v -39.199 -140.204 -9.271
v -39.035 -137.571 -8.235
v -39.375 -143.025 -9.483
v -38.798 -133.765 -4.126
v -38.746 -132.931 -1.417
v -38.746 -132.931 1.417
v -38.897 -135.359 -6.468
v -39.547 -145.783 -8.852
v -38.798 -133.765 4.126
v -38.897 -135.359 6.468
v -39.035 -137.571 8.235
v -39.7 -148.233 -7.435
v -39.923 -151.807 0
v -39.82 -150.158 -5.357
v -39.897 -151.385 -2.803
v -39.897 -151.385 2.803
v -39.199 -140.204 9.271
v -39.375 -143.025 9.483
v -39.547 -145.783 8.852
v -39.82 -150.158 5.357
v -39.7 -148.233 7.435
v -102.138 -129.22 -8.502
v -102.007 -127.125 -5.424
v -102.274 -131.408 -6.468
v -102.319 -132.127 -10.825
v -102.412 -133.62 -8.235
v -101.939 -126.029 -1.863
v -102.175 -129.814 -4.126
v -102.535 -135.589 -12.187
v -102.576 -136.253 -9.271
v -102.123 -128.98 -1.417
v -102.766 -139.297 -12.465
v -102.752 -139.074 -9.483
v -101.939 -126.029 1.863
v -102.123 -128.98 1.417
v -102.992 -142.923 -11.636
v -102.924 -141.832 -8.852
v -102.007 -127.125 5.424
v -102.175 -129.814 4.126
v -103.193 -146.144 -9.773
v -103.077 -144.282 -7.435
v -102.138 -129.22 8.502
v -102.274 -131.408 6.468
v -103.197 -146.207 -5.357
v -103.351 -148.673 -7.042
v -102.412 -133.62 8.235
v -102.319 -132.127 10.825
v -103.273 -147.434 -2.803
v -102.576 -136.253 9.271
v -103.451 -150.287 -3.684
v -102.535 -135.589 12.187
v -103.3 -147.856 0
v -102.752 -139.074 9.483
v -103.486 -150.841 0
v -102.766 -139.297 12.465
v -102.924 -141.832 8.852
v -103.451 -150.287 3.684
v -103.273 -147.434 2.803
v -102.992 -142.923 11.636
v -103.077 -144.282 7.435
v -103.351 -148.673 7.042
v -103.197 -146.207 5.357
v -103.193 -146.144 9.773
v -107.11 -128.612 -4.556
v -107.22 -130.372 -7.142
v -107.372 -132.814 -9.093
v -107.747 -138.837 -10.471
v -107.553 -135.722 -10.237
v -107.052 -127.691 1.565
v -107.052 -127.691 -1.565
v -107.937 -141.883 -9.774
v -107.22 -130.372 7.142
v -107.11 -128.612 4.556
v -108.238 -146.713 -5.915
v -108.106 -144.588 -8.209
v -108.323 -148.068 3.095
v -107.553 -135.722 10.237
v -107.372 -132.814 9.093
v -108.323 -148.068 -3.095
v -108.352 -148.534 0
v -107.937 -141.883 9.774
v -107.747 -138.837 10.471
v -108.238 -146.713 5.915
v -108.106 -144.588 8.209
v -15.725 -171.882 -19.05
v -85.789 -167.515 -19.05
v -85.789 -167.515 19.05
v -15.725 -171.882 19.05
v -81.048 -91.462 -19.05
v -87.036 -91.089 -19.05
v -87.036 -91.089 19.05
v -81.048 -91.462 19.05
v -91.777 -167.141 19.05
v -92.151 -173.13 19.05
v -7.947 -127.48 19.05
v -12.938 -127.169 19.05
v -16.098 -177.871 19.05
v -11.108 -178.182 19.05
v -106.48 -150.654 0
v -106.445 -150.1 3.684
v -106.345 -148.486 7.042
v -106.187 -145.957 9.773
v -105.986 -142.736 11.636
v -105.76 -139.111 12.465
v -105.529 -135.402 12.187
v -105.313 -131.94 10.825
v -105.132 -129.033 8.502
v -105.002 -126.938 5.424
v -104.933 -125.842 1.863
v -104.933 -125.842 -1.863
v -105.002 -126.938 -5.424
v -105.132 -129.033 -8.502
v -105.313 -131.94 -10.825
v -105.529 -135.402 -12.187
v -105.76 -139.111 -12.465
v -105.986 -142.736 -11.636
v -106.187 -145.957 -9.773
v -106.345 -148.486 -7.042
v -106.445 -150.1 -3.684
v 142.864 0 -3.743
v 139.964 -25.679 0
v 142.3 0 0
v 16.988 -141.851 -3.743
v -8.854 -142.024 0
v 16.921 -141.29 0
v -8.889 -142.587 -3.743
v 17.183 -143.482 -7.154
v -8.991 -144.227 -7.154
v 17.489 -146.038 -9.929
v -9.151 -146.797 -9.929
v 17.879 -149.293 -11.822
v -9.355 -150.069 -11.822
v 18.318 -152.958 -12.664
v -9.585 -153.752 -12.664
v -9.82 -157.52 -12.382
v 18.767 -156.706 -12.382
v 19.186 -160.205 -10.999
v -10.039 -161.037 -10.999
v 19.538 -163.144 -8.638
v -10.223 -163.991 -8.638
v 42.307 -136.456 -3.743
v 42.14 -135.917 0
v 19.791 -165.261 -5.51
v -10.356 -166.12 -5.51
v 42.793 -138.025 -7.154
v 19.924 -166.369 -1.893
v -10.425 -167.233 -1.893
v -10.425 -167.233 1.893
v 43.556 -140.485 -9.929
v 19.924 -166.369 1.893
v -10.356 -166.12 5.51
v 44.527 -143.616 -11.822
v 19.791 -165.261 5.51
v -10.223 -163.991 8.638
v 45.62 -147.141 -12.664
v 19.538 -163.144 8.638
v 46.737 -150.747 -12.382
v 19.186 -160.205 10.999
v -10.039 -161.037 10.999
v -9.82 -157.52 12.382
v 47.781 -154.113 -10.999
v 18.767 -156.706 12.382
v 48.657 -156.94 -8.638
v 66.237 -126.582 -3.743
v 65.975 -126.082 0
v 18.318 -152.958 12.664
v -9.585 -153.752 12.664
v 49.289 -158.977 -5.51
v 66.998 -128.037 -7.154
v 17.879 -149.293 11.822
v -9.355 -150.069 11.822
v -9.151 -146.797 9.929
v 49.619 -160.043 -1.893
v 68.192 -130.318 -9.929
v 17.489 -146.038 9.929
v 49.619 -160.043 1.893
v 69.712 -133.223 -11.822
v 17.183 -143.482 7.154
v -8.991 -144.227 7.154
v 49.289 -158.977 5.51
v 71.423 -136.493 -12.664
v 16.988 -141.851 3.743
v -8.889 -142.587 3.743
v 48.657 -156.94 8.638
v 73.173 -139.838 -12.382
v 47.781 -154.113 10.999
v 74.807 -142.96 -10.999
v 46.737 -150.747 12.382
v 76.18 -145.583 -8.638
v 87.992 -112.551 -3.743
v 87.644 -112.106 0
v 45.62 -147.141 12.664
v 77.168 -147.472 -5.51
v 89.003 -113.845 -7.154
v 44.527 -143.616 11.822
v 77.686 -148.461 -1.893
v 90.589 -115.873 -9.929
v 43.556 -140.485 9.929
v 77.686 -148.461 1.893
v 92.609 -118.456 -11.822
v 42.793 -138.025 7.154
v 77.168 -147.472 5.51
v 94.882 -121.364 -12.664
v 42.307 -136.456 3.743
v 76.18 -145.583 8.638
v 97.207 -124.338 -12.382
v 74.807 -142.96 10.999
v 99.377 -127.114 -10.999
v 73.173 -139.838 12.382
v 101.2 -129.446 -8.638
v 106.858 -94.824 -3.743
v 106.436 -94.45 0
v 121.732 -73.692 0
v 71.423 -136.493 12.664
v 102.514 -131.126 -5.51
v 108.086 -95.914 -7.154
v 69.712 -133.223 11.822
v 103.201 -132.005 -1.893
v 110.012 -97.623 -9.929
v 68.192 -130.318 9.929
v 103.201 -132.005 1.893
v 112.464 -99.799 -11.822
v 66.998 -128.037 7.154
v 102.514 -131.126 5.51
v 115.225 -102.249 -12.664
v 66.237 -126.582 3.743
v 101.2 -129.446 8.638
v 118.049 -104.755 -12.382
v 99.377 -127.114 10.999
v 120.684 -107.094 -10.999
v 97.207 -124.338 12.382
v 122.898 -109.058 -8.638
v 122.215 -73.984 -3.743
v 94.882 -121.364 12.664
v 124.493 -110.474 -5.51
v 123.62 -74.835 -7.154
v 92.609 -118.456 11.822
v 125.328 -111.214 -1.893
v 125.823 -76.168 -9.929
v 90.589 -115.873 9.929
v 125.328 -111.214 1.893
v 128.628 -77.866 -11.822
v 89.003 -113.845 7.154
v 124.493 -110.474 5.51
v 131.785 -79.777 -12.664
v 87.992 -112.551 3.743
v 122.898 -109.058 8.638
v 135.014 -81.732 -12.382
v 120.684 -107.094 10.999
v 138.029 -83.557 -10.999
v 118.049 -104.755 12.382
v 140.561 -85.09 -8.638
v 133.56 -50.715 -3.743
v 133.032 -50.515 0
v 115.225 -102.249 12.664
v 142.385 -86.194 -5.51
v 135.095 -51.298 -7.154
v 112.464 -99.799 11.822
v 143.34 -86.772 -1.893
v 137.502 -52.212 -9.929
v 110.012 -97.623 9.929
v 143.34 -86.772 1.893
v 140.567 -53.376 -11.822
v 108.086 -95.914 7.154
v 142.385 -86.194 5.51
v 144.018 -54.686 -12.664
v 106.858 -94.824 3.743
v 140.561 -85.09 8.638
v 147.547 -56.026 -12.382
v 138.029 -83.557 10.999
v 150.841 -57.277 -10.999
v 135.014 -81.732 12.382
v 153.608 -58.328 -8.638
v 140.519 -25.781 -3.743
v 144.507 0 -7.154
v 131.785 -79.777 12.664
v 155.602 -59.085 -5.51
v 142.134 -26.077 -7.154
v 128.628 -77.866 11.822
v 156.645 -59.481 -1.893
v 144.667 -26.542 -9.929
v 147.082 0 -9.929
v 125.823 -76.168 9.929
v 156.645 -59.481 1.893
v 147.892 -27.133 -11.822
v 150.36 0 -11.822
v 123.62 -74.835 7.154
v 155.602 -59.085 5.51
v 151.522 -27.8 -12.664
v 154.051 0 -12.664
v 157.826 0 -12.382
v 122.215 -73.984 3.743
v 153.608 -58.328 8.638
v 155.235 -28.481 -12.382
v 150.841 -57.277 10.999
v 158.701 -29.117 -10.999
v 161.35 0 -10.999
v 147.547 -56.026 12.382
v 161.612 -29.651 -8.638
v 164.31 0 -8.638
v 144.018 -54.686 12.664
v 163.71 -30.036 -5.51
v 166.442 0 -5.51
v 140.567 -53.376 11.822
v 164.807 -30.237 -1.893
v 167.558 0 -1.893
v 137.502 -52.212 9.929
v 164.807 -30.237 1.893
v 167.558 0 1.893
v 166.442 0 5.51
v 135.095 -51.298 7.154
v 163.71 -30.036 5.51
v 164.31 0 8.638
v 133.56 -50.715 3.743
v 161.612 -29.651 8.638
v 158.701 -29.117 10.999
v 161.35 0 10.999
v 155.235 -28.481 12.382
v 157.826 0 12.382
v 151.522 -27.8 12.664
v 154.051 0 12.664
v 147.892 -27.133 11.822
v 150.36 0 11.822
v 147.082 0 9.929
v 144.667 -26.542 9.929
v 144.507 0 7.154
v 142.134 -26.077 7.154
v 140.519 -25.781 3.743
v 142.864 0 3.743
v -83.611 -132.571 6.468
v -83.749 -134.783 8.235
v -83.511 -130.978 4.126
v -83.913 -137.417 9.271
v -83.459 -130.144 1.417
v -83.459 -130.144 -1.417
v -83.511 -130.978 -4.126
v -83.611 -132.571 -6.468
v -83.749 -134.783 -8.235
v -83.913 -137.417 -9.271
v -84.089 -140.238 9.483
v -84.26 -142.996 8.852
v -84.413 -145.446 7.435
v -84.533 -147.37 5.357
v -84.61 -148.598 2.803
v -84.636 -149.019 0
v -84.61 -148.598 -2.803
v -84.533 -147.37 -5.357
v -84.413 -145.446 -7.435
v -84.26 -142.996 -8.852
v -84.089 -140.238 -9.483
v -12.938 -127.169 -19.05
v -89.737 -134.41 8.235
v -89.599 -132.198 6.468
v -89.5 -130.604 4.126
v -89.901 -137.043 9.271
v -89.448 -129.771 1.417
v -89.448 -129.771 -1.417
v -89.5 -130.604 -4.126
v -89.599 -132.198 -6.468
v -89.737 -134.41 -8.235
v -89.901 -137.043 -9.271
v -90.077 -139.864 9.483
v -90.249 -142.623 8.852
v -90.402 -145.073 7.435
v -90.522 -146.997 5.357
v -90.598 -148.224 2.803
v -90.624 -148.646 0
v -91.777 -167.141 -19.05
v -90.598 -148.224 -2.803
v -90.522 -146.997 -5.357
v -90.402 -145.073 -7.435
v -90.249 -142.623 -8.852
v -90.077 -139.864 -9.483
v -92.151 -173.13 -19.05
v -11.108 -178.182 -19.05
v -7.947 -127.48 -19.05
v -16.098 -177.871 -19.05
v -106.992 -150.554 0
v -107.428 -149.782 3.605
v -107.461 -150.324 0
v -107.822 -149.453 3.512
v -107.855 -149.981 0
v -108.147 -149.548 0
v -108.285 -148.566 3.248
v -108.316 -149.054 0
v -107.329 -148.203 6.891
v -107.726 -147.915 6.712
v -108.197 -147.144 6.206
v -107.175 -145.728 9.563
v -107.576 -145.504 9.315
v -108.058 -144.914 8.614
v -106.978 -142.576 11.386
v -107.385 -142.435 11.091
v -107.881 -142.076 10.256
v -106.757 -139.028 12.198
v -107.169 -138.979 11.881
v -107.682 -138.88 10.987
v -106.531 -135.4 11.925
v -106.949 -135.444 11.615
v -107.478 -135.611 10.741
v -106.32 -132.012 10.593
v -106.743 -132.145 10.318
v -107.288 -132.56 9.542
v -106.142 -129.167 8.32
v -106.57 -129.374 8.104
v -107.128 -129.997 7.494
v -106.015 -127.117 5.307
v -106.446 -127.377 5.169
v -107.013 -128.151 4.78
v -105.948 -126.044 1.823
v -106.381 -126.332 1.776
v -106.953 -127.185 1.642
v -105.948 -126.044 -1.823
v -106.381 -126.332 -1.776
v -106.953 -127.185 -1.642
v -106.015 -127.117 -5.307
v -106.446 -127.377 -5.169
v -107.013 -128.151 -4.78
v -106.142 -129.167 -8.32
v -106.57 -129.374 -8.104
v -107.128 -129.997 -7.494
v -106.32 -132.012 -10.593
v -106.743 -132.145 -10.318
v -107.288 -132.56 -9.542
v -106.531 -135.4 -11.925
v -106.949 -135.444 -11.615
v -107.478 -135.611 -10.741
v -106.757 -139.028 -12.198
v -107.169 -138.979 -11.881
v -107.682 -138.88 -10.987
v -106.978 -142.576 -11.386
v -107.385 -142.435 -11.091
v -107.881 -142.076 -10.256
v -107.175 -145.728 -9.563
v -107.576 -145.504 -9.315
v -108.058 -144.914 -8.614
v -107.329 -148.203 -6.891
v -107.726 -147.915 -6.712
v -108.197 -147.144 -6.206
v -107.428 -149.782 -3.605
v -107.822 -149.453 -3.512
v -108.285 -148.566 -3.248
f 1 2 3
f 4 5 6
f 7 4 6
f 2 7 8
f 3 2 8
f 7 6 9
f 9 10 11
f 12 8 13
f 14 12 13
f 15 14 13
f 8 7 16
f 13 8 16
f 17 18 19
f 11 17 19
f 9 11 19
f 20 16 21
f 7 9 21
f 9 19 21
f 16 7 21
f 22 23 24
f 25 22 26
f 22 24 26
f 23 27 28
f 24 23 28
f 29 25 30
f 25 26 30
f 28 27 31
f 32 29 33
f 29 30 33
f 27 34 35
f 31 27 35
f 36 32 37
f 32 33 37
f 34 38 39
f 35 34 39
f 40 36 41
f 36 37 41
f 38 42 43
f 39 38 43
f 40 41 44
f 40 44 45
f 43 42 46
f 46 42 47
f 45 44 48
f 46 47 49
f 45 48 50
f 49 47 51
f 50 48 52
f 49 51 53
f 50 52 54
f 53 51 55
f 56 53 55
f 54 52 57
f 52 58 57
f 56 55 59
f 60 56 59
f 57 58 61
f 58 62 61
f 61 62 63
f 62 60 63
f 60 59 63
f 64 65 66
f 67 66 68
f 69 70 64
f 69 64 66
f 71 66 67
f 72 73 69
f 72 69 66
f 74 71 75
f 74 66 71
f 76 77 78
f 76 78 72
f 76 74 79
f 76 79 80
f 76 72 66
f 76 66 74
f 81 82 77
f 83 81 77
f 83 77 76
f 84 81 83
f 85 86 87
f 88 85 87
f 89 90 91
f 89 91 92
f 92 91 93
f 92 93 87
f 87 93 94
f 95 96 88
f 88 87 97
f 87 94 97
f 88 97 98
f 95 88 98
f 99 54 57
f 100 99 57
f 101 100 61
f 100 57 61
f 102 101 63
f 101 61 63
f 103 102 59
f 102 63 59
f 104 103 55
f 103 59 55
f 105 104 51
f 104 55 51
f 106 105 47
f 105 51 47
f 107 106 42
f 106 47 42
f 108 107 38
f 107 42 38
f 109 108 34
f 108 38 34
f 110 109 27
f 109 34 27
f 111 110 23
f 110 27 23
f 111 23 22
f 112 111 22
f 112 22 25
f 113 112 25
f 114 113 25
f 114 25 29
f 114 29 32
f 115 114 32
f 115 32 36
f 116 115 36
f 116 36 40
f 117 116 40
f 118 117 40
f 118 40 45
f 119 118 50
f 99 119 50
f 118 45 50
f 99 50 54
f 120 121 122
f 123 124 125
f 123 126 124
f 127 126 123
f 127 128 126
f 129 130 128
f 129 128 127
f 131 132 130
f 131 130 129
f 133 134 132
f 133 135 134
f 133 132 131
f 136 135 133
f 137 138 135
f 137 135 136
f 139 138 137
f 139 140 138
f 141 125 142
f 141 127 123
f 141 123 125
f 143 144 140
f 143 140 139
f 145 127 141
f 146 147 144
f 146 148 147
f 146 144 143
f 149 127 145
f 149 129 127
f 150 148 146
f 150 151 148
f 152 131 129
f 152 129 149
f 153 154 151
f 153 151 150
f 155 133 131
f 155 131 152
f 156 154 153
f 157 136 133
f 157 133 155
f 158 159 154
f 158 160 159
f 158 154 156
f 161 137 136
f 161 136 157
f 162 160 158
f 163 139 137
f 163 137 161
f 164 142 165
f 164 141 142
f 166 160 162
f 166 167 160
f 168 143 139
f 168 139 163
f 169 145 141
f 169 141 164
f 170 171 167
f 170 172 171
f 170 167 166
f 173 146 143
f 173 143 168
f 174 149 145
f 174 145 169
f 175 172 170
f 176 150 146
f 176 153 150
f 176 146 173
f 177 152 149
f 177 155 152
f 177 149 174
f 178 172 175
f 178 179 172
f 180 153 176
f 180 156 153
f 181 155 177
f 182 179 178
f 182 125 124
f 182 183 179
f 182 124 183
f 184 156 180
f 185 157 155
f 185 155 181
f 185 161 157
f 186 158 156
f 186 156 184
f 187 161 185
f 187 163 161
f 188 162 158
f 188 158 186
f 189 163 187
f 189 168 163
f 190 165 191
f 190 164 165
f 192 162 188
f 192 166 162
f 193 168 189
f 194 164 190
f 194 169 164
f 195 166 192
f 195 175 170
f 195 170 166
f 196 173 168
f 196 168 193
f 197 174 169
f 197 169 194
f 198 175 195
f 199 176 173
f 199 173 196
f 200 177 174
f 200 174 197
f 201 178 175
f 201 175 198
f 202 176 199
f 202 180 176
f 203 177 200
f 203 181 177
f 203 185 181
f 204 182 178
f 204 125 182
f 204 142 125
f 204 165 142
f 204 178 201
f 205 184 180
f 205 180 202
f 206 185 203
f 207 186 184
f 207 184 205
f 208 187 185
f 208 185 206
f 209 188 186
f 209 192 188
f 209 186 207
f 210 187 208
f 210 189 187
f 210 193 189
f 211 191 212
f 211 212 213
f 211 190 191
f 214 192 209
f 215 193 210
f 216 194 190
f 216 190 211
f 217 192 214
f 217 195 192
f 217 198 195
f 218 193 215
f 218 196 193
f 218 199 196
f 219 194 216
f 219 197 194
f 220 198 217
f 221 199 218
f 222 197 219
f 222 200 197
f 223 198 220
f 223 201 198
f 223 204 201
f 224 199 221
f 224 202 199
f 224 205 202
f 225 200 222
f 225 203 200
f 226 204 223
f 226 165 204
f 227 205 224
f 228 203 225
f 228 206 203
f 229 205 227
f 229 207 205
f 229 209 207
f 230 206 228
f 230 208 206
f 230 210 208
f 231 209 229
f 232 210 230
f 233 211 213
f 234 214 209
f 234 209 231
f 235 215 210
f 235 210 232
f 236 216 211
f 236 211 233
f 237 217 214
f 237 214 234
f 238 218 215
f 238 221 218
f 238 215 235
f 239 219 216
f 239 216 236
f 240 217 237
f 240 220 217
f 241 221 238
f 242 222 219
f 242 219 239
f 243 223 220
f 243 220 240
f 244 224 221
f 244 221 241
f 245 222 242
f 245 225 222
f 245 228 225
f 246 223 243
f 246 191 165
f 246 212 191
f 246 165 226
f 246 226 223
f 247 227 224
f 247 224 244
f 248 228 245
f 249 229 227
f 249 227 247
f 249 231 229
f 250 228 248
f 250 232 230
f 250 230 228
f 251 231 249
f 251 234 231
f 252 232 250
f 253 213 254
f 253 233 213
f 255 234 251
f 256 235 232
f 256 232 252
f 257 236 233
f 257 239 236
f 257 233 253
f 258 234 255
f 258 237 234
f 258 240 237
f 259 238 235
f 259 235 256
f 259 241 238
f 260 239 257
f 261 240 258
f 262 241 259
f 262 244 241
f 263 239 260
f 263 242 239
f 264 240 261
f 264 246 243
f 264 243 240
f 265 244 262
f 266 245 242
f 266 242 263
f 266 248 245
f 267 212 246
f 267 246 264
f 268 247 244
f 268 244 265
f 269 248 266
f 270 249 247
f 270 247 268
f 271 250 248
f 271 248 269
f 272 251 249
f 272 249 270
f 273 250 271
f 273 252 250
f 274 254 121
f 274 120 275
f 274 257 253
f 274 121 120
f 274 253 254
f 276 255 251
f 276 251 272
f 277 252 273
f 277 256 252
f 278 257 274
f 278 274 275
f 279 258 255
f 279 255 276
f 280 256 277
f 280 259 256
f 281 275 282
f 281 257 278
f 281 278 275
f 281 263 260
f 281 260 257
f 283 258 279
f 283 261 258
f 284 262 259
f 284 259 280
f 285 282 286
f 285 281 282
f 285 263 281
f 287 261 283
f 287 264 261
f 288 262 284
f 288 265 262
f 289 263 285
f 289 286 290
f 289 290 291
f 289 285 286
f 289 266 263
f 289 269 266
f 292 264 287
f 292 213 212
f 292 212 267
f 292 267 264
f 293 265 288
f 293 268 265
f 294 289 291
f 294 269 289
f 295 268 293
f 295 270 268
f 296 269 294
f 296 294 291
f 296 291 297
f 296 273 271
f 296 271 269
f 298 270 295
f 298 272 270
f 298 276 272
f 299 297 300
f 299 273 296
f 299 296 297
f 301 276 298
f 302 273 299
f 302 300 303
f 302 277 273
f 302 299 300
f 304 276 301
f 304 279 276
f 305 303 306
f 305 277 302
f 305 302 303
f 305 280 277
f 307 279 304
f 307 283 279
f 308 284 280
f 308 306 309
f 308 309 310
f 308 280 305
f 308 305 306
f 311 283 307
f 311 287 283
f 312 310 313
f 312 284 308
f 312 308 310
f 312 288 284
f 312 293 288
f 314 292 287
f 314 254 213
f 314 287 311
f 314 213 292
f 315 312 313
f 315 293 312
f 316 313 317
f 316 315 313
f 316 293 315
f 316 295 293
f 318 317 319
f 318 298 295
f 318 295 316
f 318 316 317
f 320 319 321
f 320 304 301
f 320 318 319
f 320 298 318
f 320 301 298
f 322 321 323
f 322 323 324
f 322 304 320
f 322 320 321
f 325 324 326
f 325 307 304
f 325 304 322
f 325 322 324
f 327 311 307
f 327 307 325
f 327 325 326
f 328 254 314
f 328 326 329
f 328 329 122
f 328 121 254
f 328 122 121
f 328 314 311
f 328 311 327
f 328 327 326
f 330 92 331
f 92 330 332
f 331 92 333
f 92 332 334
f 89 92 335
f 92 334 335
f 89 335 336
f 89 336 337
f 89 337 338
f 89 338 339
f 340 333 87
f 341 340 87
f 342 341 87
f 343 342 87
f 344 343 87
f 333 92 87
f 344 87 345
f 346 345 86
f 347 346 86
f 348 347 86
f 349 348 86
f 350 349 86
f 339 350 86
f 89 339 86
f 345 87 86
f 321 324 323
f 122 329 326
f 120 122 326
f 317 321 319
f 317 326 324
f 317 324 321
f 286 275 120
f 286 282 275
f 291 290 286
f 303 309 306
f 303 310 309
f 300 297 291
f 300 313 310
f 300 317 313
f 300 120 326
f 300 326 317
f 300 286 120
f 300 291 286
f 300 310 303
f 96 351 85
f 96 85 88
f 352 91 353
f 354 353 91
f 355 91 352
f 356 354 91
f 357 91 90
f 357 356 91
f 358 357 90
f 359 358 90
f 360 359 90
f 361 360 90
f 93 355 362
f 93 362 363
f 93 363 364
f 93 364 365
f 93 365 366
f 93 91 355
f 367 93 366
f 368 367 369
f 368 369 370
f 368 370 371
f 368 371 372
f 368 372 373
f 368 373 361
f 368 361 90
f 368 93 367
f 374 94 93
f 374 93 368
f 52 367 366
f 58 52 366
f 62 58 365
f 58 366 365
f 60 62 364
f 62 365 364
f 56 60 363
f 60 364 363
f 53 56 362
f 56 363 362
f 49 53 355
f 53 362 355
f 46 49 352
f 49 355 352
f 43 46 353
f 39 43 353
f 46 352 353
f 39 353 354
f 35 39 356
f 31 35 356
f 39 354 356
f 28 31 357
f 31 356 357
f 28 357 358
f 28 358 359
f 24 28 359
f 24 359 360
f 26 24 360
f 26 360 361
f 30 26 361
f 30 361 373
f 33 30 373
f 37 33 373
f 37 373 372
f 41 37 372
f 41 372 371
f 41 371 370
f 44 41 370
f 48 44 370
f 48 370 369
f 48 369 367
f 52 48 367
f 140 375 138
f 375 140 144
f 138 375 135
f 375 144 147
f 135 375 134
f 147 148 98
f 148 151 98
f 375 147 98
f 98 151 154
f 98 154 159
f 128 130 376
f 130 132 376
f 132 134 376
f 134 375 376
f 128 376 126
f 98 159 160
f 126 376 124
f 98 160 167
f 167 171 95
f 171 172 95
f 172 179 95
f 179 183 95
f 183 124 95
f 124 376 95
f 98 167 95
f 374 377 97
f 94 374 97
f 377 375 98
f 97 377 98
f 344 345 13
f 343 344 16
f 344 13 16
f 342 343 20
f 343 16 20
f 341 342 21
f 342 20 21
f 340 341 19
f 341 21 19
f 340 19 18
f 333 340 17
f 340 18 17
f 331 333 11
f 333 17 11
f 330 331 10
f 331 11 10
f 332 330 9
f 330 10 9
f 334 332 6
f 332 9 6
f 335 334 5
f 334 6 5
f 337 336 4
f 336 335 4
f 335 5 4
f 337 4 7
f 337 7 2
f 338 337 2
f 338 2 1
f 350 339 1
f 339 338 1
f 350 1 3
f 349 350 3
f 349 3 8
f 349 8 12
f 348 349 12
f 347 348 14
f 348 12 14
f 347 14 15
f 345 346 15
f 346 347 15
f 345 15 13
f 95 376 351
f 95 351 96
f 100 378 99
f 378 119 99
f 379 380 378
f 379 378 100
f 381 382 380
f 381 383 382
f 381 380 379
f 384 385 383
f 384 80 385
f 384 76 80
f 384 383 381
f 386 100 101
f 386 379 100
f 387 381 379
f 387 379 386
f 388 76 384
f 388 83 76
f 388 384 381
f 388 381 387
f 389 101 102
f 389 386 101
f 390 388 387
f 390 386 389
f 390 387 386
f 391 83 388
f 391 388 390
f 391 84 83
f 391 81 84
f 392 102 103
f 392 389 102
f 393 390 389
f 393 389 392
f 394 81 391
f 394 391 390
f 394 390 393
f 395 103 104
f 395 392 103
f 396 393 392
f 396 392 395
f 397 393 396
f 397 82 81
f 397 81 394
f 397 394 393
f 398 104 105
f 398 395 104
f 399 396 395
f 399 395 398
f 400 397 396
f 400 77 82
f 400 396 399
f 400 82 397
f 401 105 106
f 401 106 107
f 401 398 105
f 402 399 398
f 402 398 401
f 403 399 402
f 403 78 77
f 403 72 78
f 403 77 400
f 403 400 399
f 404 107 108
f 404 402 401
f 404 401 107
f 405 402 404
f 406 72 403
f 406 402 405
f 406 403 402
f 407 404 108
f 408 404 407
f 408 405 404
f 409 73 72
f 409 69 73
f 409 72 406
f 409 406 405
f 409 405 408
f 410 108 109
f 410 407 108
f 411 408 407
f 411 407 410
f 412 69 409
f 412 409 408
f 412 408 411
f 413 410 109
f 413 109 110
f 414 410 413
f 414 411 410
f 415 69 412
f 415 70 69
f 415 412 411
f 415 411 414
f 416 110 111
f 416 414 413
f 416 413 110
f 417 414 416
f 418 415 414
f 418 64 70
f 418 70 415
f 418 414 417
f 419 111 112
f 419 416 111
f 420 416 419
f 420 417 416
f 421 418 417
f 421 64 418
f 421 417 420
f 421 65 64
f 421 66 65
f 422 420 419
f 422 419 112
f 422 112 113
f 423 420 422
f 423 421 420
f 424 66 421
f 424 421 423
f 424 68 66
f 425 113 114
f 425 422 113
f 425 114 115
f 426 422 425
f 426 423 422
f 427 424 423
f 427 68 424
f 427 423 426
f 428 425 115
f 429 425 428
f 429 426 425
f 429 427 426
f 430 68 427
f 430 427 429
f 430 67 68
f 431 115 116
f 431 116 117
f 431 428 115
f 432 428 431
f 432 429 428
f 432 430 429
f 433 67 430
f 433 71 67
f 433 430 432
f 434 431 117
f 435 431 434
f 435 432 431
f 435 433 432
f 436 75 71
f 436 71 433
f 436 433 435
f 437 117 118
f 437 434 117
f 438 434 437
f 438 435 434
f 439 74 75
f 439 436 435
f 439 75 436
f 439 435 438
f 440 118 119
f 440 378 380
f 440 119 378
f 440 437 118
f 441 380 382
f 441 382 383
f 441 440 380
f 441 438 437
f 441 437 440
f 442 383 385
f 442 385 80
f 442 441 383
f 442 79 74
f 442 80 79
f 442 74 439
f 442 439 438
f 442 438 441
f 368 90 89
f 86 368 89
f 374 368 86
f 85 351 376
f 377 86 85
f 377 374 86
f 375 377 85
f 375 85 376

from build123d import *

# Parameters (mm, degrees)
SWEEP5_PROFILE_R         = 12.7
SKETCH70_W               = 38.1
SKETCH70_H               = 50.8
BOSS_EXTRUDE1_DEPTH      = 5
SKETCH71_W               = 38.1
SKETCH71_H               = 6
BOSS_EXTRUDE2_DEPTH      = 76.2
SKETCH72_W               = 6
SKETCH72_H               = 38.1
BOSS_EXTRUDE3_DEPTH      = 76.2
BOSS_EXTRUDE4_DEPTH      = 12.7
BOSS_EXTRUDE4_DEPTH_BACK = 50.8
SKETCH73_R               = 9.509112568
SKETCH74_R               = 12.5
BOSS_EXTRUDE5_DEPTH      = 5
FILLET1_R                = 2


with BuildPart() as part:
    # Sweep5: sweep along a path in Sketch47
    with BuildLine(Plane.XY) as sweep5_path:
        ThreePointArc((-9.644129197, -154.699679289), (106.137081113, -112.95981592), (155, 0))
    # Sweep5 profile (on start of the path) → Sweep5 (sweep)
    with BuildSketch(Plane(origin=(-9.644129197, -154.699679289, 0), x_dir=(0.06222018836928112, 0.9980624470238779, 0), z_dir=(0.9980624470238779, -0.06222018836928112, 0))):
        Circle(SWEEP5_PROFILE_R)
    sweep(path=sweep5_path.line)

    # Sketch70 → Boss-Extrude1 (add)
    with BuildSketch(Plane(origin=(0, 0, 0), x_dir=(0, 0, 1), z_dir=(-0.9980624470238779, 0.0622201883692814, 0))):
        with Locations((0, -153.127799021)):
            Rectangle(SKETCH70_W, SKETCH70_H)
    extrude(amount=BOSS_EXTRUDE1_DEPTH)

    # Sketch71 → Boss-Extrude2 (add)
    with BuildSketch(Plane(origin=(-4.990312235, 0.311100942, 0), x_dir=(0, 0, 1), z_dir=(-0.9980624470238779, 0.0622201883692814, 0))):
        with Locations((0, -175.527799021)):
            Rectangle(SKETCH71_W, SKETCH71_H)
    extrude(amount=BOSS_EXTRUDE2_DEPTH)

    # Sketch72 → Boss-Extrude3 (add)
    with BuildSketch(Plane(origin=(-10.734712154, -172.19351727, 0), x_dir=(0.9980624470238779, -0.0622201883692814, 0), z_dir=(0.0622201883692814, 0.9980624470238779, 0))):
        with Locations((-78.2, 0)):
            Rectangle(SKETCH72_W, SKETCH72_H)
    extrude(amount=BOSS_EXTRUDE3_DEPTH)

    # Sketch73 → Boss-Extrude4 (add, two sides: drawn at the far end of the back side and taken through both)
    with BuildSketch(Plane(origin=(-81.042670698, 5.052279296, 0), x_dir=(0, 0, 1), z_dir=(-0.9980624470238779, 0.06222018836928128, 0)).offset(-BOSS_EXTRUDE4_DEPTH_BACK)):
        with Locations(Location((0, -144.487448774, 0), (0, 0, 270))):
            Circle(SKETCH73_R)
    extrude(amount=BOSS_EXTRUDE4_DEPTH + BOSS_EXTRUDE4_DEPTH_BACK)

    # Sketch74 → Boss-Extrude5 (add)
    with BuildSketch(Plane(origin=(-93.718063776, 5.842475688, 0), x_dir=(0, 0, 1), z_dir=(-0.9980624470238779, 0.06222018836928128, 0))):
        with Locations(Location((0, -144.487448774, 0), (0, 0, 270))):
            Circle(SKETCH74_R)
    extrude(amount=BOSS_EXTRUDE5_DEPTH)

    # Fillet1
    fillet1_edges = [part.edges().sort_by_distance(p)[0] for p in [
        (-106.920659936, -125.578139471, 0),
    ]]
    fillet(fillet1_edges, radius=FILLET1_R)


solid = part.part
